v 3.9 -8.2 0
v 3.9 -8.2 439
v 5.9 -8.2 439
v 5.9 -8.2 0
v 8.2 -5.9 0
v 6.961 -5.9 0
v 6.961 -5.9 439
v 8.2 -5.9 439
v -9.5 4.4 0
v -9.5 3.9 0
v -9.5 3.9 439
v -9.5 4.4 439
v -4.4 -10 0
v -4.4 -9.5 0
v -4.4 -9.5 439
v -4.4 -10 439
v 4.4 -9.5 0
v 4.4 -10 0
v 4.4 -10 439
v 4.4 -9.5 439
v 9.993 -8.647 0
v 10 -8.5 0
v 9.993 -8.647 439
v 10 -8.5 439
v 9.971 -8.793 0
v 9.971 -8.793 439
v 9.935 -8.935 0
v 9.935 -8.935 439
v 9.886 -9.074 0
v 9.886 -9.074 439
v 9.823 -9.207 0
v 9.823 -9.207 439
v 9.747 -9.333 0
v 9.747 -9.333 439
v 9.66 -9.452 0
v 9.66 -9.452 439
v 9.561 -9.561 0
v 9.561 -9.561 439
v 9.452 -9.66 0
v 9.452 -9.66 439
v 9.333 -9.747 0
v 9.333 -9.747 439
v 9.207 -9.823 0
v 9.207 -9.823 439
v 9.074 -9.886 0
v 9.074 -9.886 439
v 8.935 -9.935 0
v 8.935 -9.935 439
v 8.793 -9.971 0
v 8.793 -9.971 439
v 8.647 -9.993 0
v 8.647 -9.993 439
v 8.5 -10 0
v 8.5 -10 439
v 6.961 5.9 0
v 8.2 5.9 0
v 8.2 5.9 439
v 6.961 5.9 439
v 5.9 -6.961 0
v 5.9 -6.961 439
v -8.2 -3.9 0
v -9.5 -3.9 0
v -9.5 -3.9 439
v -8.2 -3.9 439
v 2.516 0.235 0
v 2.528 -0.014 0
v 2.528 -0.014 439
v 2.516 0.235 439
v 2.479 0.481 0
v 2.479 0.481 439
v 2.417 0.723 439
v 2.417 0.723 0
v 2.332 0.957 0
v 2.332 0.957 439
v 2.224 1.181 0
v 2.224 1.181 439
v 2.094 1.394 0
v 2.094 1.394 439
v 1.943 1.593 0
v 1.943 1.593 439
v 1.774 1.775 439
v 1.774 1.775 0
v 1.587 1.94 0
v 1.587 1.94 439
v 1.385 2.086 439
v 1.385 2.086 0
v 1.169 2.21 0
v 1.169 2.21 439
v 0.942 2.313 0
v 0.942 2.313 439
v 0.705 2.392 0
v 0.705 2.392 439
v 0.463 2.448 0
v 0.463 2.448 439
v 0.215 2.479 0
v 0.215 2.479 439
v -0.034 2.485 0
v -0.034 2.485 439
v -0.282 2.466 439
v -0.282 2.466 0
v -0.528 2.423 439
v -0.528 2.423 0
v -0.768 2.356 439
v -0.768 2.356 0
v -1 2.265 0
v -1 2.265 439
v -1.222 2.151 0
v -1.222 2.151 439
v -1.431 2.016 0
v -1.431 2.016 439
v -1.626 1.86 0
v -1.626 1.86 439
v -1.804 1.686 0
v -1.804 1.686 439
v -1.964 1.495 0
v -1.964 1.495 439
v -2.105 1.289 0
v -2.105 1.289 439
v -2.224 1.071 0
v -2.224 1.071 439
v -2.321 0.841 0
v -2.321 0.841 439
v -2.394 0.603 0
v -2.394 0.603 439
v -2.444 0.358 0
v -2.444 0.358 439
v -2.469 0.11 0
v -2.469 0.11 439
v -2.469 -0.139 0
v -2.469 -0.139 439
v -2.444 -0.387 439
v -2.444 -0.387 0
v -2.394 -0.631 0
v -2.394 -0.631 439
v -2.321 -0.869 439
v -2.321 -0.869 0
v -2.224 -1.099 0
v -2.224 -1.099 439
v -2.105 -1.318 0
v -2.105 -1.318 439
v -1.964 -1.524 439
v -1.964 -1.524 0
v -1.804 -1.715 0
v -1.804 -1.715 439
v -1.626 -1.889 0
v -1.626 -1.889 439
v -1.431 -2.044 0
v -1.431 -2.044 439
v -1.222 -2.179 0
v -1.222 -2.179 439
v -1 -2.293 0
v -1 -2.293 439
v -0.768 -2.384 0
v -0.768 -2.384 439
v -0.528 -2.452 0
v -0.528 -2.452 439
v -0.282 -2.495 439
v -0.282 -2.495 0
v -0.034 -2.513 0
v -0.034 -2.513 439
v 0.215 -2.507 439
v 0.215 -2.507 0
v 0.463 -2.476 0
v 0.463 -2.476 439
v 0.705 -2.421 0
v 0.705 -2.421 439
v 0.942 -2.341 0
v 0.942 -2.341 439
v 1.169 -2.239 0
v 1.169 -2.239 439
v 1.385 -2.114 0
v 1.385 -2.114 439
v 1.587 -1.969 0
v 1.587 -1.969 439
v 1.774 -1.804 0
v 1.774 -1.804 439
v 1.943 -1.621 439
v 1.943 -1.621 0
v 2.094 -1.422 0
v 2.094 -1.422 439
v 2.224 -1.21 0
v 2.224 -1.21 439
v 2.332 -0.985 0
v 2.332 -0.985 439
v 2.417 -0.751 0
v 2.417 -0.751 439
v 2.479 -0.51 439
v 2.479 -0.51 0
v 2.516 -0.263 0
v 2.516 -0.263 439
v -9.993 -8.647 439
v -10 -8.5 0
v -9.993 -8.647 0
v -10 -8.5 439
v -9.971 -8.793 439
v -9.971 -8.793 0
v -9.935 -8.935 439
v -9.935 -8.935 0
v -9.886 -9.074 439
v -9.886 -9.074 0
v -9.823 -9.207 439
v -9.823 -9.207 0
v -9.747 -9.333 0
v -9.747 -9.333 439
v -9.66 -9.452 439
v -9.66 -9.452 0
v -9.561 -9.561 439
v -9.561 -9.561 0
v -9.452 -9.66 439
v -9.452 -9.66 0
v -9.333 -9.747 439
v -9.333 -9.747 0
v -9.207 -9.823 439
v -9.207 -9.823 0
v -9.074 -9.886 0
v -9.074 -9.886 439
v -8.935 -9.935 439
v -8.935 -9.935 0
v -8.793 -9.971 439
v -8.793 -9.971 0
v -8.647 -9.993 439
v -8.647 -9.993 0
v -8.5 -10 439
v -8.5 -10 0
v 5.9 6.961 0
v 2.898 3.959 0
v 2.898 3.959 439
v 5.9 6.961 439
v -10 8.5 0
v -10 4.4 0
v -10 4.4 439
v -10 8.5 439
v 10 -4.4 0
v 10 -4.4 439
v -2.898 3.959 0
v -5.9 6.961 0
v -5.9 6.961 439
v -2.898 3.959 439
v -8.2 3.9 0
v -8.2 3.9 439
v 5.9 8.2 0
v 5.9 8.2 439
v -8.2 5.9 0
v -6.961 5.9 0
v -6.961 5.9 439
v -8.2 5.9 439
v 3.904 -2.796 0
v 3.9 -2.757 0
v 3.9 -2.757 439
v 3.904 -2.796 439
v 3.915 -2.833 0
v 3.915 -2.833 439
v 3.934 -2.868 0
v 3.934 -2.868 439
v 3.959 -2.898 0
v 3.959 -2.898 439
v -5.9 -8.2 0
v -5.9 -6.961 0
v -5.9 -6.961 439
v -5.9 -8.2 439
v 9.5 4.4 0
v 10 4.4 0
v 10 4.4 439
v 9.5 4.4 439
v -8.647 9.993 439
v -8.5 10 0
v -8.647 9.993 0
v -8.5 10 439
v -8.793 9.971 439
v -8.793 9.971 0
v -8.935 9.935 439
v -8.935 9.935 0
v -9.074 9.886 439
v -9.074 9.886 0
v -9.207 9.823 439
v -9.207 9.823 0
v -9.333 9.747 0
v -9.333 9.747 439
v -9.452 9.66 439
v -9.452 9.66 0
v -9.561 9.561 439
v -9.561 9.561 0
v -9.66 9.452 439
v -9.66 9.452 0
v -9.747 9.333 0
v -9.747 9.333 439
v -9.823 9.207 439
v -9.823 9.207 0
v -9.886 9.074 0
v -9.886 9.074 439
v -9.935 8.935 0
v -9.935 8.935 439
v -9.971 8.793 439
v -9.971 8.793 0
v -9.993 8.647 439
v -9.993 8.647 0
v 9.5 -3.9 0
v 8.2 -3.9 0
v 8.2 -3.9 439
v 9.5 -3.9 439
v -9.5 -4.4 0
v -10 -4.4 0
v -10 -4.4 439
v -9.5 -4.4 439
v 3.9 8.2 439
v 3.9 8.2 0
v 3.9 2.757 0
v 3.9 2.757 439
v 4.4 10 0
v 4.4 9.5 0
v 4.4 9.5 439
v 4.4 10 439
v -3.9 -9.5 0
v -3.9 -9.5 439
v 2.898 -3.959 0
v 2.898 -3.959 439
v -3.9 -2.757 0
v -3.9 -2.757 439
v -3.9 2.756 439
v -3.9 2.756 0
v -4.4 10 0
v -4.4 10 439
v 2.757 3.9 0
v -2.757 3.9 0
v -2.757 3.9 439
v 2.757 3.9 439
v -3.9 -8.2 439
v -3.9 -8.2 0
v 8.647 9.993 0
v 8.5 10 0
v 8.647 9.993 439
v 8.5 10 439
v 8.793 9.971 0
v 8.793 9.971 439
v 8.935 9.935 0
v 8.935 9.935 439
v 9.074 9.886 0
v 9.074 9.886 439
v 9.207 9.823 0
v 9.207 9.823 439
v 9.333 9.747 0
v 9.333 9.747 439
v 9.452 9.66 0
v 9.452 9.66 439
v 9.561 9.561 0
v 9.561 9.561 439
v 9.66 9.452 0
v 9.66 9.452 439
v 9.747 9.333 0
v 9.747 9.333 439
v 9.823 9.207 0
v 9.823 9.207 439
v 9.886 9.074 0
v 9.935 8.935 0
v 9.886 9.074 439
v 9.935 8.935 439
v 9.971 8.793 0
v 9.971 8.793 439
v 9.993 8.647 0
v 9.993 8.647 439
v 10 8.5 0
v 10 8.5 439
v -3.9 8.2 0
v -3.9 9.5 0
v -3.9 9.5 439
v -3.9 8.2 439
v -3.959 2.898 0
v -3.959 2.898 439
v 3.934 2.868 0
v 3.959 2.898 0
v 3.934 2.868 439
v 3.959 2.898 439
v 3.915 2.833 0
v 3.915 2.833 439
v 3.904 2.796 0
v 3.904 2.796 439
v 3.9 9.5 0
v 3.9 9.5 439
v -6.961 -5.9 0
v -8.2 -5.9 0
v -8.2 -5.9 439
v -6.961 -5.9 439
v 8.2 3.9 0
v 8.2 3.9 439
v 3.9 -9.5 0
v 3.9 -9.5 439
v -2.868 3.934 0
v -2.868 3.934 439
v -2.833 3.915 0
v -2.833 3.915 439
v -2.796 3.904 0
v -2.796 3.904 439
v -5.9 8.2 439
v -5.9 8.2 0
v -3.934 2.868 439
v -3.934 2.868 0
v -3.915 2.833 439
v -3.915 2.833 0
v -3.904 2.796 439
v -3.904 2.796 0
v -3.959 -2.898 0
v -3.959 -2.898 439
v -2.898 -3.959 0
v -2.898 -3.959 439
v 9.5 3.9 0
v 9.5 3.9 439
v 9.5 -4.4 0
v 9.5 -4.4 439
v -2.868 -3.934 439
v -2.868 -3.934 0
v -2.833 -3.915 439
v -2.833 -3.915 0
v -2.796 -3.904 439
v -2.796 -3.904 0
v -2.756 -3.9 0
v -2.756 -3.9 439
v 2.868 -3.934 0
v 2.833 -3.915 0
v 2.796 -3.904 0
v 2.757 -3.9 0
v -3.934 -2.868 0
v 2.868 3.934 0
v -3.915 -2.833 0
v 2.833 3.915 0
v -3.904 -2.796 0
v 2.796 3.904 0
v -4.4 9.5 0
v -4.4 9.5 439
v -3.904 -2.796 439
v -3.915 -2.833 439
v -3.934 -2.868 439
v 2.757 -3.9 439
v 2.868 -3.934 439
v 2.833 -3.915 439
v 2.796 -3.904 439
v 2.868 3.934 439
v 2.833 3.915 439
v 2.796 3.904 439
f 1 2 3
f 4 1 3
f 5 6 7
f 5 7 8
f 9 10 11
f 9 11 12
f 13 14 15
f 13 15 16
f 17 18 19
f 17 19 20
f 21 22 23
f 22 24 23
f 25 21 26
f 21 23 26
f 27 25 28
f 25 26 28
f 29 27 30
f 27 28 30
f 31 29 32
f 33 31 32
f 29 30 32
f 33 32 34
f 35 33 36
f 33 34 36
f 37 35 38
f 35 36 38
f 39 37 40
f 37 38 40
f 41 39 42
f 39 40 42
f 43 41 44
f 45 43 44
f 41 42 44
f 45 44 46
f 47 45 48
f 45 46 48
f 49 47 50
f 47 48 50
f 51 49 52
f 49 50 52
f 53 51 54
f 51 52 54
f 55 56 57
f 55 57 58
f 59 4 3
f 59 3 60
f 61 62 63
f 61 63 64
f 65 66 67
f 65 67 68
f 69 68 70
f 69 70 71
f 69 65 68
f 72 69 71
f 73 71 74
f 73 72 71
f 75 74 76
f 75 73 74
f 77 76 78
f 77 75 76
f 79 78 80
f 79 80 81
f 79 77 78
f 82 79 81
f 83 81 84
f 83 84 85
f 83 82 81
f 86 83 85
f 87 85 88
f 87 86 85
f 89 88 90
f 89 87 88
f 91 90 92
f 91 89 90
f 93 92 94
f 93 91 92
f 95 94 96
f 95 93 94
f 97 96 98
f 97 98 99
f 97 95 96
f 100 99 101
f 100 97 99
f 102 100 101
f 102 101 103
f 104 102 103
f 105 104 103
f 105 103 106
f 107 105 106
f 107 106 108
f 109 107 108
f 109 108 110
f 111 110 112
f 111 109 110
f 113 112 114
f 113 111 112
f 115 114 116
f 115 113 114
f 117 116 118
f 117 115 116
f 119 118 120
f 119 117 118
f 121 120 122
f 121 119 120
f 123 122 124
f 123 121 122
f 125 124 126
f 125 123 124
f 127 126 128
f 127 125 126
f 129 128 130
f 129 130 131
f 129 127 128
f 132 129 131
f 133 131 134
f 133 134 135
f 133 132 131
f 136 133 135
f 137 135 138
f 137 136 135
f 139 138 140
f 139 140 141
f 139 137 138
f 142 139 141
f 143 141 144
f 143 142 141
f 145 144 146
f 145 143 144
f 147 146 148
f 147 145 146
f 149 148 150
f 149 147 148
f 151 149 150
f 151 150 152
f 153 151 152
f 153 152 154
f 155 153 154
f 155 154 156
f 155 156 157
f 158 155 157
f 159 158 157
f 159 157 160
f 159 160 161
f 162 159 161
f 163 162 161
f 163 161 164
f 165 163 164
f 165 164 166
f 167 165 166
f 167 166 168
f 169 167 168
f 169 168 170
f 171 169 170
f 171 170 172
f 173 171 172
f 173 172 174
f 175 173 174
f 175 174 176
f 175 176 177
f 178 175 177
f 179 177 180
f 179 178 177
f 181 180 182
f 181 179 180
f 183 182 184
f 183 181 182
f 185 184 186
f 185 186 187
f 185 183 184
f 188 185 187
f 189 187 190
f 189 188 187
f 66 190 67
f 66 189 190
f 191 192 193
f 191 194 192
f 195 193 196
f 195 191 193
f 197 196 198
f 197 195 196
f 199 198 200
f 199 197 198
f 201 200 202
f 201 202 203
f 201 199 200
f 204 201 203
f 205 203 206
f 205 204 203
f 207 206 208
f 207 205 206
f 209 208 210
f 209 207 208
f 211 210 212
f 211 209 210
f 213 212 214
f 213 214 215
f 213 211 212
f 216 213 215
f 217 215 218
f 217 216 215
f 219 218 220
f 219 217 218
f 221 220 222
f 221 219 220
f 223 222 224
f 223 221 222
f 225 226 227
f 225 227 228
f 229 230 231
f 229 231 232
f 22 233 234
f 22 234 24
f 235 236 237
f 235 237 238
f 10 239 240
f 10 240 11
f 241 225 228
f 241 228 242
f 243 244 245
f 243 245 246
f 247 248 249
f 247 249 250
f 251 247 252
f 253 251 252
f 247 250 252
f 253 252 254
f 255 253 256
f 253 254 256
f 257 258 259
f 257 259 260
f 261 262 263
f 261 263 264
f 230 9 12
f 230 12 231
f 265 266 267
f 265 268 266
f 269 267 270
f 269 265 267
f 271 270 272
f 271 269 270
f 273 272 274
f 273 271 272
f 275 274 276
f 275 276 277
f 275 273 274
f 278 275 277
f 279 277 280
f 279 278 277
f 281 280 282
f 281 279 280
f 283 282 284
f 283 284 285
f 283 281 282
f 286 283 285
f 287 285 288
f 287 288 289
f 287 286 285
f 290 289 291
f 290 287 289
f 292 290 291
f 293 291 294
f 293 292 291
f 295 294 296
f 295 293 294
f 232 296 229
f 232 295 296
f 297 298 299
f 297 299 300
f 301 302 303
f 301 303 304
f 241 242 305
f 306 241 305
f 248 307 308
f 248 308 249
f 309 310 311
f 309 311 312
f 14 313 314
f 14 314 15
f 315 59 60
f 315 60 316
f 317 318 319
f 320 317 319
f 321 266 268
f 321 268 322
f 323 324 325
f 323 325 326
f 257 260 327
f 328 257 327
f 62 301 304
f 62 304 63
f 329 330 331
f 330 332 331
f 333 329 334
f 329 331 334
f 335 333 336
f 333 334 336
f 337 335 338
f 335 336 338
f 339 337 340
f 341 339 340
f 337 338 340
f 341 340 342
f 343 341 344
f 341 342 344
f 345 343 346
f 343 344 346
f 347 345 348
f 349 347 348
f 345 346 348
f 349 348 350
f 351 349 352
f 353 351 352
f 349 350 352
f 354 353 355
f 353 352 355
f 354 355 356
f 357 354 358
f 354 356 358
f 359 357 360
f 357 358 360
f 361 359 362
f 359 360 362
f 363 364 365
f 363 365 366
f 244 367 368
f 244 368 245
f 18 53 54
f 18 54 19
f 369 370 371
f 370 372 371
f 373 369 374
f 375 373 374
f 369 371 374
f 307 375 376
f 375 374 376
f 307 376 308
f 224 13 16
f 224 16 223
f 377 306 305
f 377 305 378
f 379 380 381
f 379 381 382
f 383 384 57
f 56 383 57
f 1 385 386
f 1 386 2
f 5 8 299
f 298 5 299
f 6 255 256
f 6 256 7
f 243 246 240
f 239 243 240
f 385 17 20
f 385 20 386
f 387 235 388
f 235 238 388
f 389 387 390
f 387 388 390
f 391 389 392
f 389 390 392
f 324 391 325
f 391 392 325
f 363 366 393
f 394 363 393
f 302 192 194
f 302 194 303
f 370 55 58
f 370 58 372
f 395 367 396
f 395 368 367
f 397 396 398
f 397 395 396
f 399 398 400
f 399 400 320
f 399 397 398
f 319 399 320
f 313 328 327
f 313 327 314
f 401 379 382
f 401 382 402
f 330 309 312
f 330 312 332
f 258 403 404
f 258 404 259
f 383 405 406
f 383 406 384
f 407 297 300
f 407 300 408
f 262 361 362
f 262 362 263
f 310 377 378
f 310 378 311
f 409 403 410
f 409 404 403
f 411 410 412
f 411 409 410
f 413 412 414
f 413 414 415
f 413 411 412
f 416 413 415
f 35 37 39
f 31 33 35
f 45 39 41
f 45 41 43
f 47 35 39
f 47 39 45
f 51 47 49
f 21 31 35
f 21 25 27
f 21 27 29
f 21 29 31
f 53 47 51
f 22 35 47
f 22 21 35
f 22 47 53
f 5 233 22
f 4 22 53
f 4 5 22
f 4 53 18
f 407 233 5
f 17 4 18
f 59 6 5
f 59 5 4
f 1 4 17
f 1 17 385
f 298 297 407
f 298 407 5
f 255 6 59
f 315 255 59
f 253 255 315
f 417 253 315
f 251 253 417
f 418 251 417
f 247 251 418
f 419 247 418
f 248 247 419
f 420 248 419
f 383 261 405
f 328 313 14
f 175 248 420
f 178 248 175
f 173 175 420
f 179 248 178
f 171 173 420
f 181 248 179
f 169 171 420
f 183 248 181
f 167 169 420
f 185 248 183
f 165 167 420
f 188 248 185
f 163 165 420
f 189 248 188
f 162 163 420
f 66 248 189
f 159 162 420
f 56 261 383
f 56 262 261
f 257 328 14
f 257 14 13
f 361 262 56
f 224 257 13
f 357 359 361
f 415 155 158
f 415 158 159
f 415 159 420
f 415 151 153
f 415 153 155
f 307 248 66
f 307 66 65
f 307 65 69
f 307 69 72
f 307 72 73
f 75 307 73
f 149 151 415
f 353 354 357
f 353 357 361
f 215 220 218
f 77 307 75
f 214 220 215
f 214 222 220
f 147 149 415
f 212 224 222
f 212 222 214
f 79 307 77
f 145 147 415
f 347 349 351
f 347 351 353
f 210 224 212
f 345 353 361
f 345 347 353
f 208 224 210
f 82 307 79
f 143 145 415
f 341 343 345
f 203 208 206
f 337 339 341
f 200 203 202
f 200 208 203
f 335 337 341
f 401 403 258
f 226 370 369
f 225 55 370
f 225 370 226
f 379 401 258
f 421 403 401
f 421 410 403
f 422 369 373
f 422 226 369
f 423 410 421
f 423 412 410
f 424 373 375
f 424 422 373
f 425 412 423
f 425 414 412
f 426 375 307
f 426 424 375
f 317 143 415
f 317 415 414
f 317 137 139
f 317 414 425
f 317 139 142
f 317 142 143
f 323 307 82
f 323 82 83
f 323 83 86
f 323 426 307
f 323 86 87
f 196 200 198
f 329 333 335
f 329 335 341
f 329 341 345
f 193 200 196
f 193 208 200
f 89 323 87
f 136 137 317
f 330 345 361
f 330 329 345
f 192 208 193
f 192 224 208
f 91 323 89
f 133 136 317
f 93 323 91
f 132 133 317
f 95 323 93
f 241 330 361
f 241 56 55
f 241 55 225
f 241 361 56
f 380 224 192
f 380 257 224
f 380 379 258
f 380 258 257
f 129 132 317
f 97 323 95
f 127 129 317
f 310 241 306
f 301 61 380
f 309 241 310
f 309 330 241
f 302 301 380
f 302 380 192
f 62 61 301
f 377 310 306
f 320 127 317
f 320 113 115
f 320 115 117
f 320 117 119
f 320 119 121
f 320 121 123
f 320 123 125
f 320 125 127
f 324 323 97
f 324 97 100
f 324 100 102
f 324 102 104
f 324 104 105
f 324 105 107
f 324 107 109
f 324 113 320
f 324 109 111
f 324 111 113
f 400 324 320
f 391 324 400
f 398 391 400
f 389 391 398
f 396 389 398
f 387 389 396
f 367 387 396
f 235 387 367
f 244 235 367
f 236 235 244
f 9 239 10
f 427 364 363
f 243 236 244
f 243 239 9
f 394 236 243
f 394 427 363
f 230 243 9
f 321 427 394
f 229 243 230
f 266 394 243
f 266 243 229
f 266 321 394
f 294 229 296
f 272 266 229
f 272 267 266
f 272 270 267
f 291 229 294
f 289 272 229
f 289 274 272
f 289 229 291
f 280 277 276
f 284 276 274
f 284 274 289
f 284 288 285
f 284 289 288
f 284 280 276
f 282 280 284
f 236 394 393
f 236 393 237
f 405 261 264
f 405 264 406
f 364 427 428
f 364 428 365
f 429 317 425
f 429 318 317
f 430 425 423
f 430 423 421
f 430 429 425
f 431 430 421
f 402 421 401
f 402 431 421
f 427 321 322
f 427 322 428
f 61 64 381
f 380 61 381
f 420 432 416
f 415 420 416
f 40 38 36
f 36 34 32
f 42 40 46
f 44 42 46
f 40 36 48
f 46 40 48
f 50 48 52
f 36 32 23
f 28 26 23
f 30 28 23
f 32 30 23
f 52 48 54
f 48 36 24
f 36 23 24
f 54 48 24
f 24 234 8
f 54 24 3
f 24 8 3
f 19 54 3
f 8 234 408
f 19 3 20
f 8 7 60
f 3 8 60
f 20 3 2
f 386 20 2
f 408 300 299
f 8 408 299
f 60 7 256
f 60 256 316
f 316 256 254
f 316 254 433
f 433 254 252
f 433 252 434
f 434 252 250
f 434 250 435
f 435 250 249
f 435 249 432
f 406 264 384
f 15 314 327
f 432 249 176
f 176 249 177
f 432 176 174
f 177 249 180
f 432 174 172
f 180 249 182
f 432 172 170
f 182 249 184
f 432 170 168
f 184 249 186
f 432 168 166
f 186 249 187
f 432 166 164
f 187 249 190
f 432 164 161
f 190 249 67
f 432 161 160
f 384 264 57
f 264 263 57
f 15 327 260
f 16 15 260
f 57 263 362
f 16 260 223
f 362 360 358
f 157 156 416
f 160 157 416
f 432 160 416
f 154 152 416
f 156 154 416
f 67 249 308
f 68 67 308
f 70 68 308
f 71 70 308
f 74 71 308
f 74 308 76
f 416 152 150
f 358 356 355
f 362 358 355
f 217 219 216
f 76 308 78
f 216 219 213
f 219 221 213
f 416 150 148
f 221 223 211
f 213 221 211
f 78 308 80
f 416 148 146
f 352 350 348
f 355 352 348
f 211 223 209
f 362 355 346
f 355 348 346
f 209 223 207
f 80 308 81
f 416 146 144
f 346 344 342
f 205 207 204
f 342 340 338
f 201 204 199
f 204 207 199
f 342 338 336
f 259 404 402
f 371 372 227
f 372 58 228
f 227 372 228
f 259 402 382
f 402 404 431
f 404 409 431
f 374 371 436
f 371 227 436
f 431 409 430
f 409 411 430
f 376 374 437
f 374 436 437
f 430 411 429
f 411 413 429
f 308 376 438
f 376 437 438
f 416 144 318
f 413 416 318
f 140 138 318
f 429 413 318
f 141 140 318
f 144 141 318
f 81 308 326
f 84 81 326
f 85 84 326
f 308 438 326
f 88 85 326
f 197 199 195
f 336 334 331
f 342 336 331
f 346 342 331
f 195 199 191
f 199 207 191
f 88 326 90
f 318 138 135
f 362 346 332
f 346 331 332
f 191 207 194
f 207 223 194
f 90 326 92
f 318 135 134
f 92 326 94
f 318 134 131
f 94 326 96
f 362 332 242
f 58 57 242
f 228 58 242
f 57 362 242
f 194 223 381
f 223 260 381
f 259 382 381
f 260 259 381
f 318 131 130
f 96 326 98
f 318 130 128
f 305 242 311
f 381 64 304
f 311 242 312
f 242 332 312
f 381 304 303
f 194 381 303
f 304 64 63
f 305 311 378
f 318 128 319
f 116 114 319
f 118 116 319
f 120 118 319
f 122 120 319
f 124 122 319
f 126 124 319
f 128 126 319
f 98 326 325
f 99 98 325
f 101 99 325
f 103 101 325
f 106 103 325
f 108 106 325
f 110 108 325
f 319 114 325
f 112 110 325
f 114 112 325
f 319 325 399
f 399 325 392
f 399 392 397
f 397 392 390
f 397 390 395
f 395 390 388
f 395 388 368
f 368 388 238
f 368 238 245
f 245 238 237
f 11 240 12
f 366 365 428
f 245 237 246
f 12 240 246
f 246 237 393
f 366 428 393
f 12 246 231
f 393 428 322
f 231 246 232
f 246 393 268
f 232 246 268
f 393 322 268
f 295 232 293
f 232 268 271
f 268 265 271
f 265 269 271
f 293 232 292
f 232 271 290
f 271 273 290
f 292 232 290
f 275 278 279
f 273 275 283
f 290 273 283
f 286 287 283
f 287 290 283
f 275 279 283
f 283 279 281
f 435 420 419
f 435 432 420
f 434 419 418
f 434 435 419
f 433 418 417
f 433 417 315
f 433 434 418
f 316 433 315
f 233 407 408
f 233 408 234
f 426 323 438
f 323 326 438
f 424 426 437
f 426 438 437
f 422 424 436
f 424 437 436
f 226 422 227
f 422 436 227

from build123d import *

# Parameters (mm, degrees)
SKETCH_1_R      = 2.5
EXTRUDE_1_DEPTH = 439
FILLET_1_R      = 1.5
FILLET_2_R      = 0.2


with BuildPart() as part:
    # 草图1 → 凸台-拉伸1 (new body)
    with BuildSketch(Plane.XY):
        Polygon((-10, 10), (-4.4, 10), (-4.4, 9.5), (-3.9, 9.5), (-3.9, 8.2), (-5.9, 8.2), (-5.9, 6.960660172), (-2.839608303, 3.900131414), (2.839471243, 3.900131414), (5.9, 6.960660172), (5.9, 8.2), (3.9, 8.2), (3.9, 9.5), (4.4, 9.5), (4.4, 10), (10, 10), (10, 4.4), (9.5, 4.4), (9.5, 3.9), (8.2, 3.9), (8.2, 5.9), (6.960660172, 5.9), (3.900131414, 2.839608303), (3.900131414, -2.839471243), (6.960660172, -5.9), (8.2, -5.9), (8.2, -3.9), (9.5, -3.9), (9.5, -4.4), (10, -4.4), (10, -10), (4.4, -10), (4.4, -9.5), (3.9, -9.5), (3.9, -8.2), (5.9, -8.2), (5.9, -6.960660172), (2.839471243, -3.899994348), (-2.839334176, -3.899994348), (-5.9, -6.960660172), (-5.9, -8.2), (-3.9, -8.2), (-3.9, -9.5), (-4.4, -9.5), (-4.4, -10), (-10, -10), (-10, -4.4), (-9.5, -4.4), (-9.5, -3.9), (-8.2, -3.9), (-8.2, -5.9), (-6.960660172, -5.9), (-3.899994348, -2.839471243), (-3.899994348, 2.839334176), (-6.960660172, 5.9), (-8.2, 5.9), (-8.2, 3.9), (-9.5, 3.9), (-9.5, 4.4), (-10, 4.4), align=None)
        with Locations((0.02838442, -0.01419221)):
            Circle(SKETCH_1_R, mode=Mode.SUBTRACT)
    extrude(amount=EXTRUDE_1_DEPTH)

    # 圆角1
    fillet_1_edges = [part.edges().sort_by_distance(p)[0] for p in [
        (10, 10, 219.5),
        (10, -10, 219.5),
        (-10, -10, 219.5),
        (-10, 10, 219.5),
    ]]
    fillet(fillet_1_edges, radius=FILLET_1_R)

    # 圆角2
    fillet_2_edges = [part.edges().sort_by_distance(p)[0] for p in [
        (3.900131414, 2.839608303, 219.5),
        (3.900131414, -2.839471243, 219.5),
        (2.839471243, -3.899994348, 219.5),
        (-2.839334176, -3.899994348, 219.5),
        (-3.899994348, -2.839471243, 219.5),
        (-3.899994348, 2.839334176, 219.5),
        (-2.839608303, 3.900131414, 219.5),
        (2.839471243, 3.900131414, 219.5),
    ]]
    fillet(fillet_2_edges, radius=FILLET_2_R)


solid = part.part
